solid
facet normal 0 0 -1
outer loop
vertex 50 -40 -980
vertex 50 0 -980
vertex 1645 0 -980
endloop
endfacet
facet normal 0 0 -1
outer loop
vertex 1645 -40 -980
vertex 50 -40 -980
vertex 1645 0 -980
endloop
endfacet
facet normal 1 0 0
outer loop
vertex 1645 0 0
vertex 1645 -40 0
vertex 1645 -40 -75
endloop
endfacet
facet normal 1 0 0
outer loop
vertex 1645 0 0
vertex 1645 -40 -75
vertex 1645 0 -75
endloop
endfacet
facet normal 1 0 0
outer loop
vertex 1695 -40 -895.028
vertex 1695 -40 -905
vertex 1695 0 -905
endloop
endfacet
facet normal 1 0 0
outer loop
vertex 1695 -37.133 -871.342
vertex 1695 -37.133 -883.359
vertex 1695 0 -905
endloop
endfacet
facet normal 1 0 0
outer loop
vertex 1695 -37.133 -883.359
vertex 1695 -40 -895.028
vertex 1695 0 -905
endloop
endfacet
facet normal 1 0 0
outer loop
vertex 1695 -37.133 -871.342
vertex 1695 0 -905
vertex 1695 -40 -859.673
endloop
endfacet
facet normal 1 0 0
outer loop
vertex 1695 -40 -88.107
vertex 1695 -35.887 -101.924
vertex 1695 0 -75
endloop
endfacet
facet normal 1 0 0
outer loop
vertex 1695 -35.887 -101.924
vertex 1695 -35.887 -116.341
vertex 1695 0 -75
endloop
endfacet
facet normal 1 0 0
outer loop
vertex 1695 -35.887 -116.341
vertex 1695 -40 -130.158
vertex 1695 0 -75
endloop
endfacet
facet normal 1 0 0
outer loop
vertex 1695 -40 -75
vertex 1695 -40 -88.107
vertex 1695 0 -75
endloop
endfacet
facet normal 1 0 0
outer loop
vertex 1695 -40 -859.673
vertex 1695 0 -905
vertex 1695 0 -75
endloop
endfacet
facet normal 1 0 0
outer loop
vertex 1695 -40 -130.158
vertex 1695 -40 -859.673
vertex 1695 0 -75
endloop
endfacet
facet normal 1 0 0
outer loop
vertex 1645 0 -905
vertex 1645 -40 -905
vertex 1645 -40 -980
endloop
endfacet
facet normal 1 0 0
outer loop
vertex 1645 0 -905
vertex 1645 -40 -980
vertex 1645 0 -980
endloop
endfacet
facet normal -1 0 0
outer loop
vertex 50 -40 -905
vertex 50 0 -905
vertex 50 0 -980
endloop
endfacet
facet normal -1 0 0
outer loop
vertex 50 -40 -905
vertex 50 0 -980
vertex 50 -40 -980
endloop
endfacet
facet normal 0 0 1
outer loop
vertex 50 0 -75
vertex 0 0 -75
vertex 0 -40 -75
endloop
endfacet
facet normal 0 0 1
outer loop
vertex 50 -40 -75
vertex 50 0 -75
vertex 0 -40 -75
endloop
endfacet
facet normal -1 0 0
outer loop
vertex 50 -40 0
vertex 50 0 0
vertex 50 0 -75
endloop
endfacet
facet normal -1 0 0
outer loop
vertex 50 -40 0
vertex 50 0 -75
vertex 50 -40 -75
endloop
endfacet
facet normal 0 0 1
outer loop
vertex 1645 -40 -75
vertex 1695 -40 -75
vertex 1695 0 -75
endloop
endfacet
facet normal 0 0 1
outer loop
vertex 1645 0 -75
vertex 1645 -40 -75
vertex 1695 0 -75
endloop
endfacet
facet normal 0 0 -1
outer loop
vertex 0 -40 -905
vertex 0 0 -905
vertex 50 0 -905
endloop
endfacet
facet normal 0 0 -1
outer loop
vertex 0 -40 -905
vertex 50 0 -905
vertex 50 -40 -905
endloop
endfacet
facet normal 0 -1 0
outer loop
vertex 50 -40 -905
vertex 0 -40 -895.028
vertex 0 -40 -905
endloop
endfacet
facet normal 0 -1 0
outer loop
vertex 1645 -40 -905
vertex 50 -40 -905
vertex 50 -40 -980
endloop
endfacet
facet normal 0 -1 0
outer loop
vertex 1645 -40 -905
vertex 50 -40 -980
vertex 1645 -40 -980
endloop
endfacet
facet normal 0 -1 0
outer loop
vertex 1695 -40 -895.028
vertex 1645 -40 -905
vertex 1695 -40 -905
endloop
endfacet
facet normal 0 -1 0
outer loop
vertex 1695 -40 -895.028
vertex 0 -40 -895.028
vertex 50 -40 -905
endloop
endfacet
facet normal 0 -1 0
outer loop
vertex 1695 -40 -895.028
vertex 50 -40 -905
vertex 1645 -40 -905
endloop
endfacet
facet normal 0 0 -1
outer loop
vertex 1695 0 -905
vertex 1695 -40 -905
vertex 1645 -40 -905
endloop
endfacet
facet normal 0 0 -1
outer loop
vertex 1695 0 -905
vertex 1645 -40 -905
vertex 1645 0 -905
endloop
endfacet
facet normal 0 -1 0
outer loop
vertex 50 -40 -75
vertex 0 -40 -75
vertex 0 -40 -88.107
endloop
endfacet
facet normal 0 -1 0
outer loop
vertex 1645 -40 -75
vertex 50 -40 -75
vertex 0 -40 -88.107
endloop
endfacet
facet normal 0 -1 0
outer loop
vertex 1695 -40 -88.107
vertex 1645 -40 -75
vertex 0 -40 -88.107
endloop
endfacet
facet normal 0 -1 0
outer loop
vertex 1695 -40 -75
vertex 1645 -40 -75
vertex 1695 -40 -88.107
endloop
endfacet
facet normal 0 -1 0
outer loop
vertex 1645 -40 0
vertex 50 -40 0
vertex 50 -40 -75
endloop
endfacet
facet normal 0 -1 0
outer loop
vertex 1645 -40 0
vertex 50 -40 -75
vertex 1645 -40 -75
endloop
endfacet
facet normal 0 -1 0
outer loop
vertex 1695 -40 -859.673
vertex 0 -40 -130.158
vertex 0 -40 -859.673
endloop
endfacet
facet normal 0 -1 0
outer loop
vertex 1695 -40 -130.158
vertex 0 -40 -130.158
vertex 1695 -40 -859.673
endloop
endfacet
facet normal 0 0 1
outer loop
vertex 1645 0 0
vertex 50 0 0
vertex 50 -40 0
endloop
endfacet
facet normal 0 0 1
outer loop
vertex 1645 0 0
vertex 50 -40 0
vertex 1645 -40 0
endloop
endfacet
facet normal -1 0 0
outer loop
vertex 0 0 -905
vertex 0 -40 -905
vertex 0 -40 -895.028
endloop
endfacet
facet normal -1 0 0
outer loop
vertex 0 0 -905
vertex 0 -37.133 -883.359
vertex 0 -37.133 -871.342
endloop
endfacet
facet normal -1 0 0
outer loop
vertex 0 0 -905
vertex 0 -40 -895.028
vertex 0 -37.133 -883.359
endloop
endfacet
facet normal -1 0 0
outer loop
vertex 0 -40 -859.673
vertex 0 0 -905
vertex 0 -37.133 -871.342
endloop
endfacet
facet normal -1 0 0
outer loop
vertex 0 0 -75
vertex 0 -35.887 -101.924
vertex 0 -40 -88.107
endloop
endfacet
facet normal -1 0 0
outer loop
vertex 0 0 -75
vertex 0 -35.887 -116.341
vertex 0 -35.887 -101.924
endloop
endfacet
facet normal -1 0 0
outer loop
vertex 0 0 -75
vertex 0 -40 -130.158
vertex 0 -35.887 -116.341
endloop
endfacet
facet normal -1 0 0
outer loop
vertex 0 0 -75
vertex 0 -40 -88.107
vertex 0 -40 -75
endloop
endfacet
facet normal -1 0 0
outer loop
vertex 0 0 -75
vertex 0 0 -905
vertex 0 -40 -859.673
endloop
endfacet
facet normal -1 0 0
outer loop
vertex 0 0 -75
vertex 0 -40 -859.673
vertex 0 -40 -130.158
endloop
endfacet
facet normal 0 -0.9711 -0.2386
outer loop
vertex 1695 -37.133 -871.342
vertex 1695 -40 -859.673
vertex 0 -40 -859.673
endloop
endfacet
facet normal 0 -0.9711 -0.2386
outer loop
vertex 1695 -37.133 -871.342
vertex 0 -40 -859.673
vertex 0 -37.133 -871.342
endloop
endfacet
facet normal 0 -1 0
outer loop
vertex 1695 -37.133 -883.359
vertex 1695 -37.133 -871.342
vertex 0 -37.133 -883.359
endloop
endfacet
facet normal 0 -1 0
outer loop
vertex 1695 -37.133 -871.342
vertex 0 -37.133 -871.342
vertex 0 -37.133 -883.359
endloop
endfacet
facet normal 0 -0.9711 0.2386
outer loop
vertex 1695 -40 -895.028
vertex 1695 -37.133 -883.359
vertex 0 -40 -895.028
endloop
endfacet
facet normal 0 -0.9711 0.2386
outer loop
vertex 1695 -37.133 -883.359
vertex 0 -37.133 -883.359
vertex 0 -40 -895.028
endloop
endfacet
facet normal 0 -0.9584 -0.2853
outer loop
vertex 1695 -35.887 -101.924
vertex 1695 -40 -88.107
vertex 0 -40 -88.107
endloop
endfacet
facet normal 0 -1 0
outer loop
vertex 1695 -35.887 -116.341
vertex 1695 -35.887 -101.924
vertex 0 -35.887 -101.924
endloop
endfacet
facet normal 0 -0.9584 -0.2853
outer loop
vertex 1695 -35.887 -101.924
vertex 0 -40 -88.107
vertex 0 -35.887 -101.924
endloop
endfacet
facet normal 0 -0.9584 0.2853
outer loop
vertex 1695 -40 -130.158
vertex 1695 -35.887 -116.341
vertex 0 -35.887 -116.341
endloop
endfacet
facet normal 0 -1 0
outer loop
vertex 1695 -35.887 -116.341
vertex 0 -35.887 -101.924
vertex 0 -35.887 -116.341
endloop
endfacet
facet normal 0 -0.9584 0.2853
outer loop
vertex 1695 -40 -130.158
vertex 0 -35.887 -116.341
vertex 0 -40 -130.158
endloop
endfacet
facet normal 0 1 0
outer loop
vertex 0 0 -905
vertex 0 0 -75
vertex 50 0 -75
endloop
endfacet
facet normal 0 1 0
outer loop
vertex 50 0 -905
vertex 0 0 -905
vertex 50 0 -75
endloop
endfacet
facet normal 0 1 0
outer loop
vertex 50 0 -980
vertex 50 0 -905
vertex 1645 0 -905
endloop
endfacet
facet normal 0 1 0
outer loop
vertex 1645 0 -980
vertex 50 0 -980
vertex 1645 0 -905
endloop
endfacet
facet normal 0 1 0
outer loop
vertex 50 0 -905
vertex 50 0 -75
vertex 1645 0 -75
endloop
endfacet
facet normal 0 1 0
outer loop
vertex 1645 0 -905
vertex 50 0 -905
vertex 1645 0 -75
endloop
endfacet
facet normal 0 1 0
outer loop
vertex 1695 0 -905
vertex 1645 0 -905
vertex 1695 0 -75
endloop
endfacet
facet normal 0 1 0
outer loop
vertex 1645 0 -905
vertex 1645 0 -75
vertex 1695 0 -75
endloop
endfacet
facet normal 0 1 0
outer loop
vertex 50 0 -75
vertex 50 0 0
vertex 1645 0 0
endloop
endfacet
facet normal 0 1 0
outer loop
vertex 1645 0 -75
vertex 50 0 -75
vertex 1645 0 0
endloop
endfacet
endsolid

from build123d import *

# Parameters (mm, degrees)
F0_W     = 1695
F0_H     = 980
F1_DEPTH = 40
F2_R     = 50
F3_DEPTH = 1695.001
F6_W     = 40
F6_H     = 75
F7_DEPTH = 50
F8_W     = 40
F8_H     = 75
F9_DEPTH = 50


# Not quite as in the source:
# - a feature of the source that left no trace in its solid (it failed there, or was rolled back) is left out


with BuildPart() as f1:
    # F0 (on Front) → F1 (new body)
    with BuildSketch(Plane.XZ):
        with Locations((847.5, -490)):
            Rectangle(F0_W, F0_H)
    extrude(amount=F1_DEPTH)

    # F2 (on face) → F3 (cut, through all)
    with BuildSketch(Plane(origin=(0, 0, 0), x_dir=(0, -1, 0), z_dir=(-1, 0, 0))):
        with Locations((85.3642523289, -109.1325581074)):
            Circle(F2_R)
        with Locations((86.7706388235, -877.3503899574)):
            Circle(F2_R)
    extrude(amount=-F3_DEPTH, mode=Mode.SUBTRACT)

    # F6 (on face) → F7 (cut)
    with BuildSketch(Plane(origin=(0, 0, 0), x_dir=(0, -1, 0), z_dir=(-1, 0, 0))):
        with Locations((20, -37.5)):
            Rectangle(F6_W, F6_H)
        with Locations((20, -942.5)):
            Rectangle(F6_W, F6_H)
    extrude(amount=-F7_DEPTH, mode=Mode.SUBTRACT)

    # F8 (on face) → F9 (cut)
    with BuildSketch(Plane.YZ.offset(1695)):
        with Locations((-20, -37.5)):
            Rectangle(F8_W, F8_H)
        with Locations((-20, -942.5)):
            Rectangle(F8_W, F8_H)
    extrude(amount=-F9_DEPTH, mode=Mode.SUBTRACT)


solid = f1.part
